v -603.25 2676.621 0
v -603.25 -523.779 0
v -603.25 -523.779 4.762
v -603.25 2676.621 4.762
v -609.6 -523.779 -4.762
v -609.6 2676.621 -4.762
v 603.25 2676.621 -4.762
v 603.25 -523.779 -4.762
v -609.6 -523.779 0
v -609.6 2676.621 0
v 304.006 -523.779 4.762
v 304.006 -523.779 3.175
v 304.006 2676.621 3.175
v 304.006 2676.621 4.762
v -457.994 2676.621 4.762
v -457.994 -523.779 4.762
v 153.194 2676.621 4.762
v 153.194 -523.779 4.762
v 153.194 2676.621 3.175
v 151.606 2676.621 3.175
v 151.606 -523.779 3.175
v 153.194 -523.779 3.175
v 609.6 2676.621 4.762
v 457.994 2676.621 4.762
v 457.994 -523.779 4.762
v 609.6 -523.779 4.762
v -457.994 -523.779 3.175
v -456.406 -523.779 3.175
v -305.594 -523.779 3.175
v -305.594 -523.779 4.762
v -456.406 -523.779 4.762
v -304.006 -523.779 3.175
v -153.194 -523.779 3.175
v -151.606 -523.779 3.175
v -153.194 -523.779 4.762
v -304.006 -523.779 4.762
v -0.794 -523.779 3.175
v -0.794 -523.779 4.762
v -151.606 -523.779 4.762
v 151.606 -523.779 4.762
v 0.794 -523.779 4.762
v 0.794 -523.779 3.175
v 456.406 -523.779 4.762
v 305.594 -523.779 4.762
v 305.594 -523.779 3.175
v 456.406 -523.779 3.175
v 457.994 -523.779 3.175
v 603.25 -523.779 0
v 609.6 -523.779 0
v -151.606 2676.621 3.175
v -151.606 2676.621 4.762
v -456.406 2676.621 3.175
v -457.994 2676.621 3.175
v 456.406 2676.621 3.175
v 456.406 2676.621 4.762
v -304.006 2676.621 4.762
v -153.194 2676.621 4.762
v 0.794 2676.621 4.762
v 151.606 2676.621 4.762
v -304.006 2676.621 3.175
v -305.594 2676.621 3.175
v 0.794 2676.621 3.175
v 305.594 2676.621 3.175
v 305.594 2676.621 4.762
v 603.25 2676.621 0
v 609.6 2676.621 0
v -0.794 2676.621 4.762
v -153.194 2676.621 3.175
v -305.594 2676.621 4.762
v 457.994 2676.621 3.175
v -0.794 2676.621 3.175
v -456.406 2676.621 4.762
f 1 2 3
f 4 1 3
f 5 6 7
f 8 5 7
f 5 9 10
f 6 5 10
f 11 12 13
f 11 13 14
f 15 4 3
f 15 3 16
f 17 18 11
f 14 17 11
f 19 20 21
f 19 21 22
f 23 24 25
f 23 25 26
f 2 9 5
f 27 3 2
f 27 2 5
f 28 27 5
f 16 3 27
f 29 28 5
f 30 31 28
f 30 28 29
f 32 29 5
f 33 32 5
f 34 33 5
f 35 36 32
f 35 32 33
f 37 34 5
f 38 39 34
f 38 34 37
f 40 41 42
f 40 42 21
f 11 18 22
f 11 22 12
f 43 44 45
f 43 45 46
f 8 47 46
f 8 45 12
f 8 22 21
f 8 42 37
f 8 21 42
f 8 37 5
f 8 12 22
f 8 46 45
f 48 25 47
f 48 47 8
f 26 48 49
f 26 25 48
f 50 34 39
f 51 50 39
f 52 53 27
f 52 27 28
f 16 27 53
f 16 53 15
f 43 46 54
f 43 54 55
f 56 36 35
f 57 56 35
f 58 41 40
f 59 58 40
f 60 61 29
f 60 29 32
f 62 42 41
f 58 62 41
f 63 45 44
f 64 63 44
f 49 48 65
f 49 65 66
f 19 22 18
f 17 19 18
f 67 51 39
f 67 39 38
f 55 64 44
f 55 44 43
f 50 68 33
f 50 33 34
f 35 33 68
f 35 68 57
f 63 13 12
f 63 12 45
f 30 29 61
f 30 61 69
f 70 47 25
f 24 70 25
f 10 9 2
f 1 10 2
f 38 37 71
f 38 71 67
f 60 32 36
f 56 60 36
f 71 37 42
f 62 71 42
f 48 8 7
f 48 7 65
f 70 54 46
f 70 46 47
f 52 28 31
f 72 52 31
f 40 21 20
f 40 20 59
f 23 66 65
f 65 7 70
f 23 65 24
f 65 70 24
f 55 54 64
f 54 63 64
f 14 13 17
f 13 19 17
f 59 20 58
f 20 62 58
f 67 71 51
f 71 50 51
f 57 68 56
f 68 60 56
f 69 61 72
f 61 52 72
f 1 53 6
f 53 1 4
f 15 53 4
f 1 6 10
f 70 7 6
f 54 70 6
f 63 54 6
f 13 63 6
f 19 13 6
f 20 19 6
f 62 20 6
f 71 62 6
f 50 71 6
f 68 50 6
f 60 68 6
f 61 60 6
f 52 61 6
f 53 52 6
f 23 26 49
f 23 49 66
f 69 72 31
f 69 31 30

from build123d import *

# Parameters (mm, degrees)
F0_W     = 1219.2
F0_H     = 3654.425
F1_DEPTH = 4.7625
F2_W     = 6.35
F2_H     = 4.7625
F3_DEPTH = 3654.426
F4_W     = 1.5875
F4_H     = 1.5875
F5_DEPTH = 3654.426
F6_W     = 454.025
F6_H     = 9.525
F7_DEPTH = 1219.201


with BuildPart() as f1:
    # F0 (on Top) → F1 (new body, symmetric)
    with BuildSketch(Plane.XY):
        with Locations((0, 1303.43302)):
            Rectangle(F0_W, F0_H)
    extrude(amount=F1_DEPTH, both=True)

    # F2 (on face) → F3 (cut, through all)
    with BuildSketch(Plane.XZ.offset(523.77948)):
        with Locations((606.425, -2.38125)):
            Rectangle(F2_W, F2_H)
        with Locations((-606.425, 2.38125)):
            Rectangle(F2_W, F2_H)
    extrude(amount=-F3_DEPTH, mode=Mode.SUBTRACT)

    # F4 (on face) → F5 (cut, through all)
    with BuildSketch(Plane.XZ.offset(523.77948)):
        with Locations((-457.2, 3.96875)):
            Rectangle(F4_W, F4_H)
        with Locations((-304.8, 3.96875)):
            Rectangle(F4_W, F4_H)
        with Locations((-152.4, 3.96875)):
            Rectangle(F4_W, F4_H)
        with Locations((0, 3.96875)):
            Rectangle(F4_W, F4_H)
        with Locations((152.4, 3.96875)):
            Rectangle(F4_W, F4_H)
        with Locations((304.8, 3.96875)):
            Rectangle(F4_W, F4_H)
        with Locations((457.2, 3.96875)):
            Rectangle(F4_W, F4_H)
    extrude(amount=-F5_DEPTH, mode=Mode.SUBTRACT)

    # F6 (on face) → F7 (cut, through all)
    with BuildSketch(Plane(origin=(-609.6, 0, 0), x_dir=(0, -1, 0), z_dir=(-1, 0, 0))):
        with Locations((-2903.63302, 0)):
            Rectangle(F6_W, F6_H)
    extrude(amount=-F7_DEPTH, mode=Mode.SUBTRACT)


solid = f1.part
